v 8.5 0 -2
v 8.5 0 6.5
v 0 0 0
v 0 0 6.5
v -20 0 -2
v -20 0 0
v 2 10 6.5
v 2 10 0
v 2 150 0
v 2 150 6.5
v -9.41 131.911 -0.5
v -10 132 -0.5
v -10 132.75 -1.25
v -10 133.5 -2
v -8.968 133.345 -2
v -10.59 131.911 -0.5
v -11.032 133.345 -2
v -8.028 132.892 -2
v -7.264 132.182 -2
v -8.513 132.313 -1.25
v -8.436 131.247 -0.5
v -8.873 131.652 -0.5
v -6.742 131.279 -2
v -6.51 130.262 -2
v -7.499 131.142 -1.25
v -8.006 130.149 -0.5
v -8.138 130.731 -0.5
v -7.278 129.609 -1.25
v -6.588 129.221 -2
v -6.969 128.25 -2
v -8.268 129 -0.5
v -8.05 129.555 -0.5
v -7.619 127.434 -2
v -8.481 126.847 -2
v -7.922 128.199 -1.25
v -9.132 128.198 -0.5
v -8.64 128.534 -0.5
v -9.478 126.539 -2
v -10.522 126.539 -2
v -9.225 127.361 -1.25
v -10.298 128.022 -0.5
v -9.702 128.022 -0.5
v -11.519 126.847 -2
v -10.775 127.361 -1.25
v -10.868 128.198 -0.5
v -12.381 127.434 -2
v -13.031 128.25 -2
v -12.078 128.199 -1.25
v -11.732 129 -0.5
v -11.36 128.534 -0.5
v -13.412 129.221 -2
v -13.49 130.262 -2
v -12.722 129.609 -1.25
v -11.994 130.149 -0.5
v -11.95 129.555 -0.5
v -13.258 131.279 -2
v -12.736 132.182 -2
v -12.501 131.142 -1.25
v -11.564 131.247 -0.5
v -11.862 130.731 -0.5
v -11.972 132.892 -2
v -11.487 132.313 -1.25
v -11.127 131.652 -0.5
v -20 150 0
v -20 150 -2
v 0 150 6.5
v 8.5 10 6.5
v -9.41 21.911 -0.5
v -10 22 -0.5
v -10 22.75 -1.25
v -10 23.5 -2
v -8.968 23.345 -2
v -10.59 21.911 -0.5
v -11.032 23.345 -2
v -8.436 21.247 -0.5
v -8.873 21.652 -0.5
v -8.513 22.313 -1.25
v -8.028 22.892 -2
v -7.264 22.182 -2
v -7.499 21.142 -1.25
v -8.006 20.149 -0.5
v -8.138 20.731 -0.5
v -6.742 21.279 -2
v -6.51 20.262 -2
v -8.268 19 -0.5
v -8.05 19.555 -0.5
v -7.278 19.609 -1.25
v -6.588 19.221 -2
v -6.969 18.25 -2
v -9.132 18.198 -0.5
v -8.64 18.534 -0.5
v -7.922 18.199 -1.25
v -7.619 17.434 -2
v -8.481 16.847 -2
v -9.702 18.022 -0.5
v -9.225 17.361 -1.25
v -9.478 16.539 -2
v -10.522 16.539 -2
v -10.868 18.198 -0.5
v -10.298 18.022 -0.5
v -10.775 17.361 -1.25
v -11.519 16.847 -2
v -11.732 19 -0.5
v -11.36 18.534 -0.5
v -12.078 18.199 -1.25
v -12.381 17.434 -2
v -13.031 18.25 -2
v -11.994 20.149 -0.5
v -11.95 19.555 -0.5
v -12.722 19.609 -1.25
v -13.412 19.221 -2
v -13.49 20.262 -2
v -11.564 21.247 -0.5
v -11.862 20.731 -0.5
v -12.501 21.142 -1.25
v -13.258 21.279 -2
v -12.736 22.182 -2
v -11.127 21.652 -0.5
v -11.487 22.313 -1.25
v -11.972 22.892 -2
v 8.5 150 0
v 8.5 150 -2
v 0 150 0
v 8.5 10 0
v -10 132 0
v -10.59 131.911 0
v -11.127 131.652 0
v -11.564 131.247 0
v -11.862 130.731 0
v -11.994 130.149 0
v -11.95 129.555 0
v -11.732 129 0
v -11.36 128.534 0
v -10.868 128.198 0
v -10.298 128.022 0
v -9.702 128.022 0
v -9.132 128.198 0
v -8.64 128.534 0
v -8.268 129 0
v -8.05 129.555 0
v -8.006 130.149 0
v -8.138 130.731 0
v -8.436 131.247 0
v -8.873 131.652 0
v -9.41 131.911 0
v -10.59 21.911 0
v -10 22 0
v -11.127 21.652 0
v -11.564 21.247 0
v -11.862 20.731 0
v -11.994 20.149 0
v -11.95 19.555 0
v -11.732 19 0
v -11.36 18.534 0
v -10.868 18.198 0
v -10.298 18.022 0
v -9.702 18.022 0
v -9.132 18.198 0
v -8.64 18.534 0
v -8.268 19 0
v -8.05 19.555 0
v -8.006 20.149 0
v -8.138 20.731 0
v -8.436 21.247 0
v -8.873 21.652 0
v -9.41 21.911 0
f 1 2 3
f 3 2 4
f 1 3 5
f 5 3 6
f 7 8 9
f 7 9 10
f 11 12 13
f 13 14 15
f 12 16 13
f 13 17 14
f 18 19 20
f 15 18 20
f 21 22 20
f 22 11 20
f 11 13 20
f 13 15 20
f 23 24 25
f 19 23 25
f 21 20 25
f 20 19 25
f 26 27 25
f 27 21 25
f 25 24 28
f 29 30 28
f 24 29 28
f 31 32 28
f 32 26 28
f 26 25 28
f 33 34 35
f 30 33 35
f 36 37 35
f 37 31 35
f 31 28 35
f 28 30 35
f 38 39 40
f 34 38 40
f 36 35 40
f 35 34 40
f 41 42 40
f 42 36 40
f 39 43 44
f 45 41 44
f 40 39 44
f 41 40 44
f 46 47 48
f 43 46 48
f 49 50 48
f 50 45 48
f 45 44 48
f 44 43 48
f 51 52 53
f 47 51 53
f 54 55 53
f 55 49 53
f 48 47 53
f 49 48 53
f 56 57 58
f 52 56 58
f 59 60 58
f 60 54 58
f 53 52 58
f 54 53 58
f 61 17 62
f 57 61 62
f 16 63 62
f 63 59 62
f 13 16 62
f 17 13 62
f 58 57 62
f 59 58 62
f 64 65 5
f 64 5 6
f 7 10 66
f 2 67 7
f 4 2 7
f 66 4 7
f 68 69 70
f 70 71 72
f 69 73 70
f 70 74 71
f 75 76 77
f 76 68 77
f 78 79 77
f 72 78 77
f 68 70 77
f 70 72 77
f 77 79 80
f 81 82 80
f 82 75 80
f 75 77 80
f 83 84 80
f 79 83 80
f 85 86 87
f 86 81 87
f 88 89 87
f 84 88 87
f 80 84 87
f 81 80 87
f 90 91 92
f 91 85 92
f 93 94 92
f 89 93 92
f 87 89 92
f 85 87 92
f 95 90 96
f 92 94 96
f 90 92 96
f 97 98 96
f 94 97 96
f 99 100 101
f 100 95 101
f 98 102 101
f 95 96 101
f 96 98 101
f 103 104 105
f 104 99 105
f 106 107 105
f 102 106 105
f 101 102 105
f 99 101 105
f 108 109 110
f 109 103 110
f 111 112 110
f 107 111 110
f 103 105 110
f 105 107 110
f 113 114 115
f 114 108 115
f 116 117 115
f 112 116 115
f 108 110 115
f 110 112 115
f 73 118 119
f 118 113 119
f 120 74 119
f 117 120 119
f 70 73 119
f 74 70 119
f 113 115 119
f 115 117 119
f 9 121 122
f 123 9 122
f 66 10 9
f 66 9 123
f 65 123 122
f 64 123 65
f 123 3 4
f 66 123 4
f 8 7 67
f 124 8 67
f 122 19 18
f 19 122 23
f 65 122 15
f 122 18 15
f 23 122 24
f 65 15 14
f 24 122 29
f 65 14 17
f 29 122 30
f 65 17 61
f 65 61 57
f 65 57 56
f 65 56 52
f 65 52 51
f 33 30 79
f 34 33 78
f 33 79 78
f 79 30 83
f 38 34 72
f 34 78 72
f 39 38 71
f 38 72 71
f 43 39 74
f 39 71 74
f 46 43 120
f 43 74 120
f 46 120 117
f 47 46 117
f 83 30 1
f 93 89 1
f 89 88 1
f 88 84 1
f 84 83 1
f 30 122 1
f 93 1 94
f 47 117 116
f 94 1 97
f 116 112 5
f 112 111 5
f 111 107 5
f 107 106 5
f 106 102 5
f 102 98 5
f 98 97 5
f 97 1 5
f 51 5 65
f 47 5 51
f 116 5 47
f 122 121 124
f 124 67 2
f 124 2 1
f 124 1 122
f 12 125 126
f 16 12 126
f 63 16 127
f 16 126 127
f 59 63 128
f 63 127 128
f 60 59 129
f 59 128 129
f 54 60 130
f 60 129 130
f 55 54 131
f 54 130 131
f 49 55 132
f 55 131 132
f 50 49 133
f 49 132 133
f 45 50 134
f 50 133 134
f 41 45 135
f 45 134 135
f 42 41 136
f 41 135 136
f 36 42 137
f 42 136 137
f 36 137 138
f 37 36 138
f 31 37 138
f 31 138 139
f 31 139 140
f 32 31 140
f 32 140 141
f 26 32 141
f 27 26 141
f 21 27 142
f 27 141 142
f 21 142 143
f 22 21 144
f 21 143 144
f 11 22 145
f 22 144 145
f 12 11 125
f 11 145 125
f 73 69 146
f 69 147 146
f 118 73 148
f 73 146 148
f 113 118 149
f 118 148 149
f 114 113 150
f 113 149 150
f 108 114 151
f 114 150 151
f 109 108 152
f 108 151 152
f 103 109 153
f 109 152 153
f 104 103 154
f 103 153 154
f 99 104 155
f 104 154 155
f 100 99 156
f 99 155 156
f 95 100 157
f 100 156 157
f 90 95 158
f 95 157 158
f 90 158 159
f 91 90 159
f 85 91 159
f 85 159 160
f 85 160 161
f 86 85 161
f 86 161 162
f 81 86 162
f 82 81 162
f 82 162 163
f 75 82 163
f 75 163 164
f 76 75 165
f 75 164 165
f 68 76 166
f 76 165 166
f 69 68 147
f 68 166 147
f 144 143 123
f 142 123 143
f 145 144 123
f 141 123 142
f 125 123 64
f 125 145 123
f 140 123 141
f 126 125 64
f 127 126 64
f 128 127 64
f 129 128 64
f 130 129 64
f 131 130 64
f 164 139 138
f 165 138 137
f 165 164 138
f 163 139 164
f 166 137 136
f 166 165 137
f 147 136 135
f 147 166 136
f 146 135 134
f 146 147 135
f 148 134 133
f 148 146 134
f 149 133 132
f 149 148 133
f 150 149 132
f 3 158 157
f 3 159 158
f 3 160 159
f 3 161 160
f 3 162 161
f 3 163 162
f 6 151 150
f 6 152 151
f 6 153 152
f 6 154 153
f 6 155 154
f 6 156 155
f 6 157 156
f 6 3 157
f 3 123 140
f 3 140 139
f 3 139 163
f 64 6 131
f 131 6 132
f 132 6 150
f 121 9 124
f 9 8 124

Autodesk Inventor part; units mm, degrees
ref_plane "YZ Plane" through (0, 0, 0) normal (1, 0, 0) x (0, 1, 0)
ref_plane "XZ Plane" through (0, 0, 0) normal (0, 1, 0) x (-1, 0, 0)
ref_plane "XY Plane" through (0, 0, 0) normal (0, 0, 1) x (1, 0, 0)
sketch "Sketch1" plane through (0, 0, 0) normal (0, 1, 0) x (-1, 0, 0)
  line L0 (0, 0) -> (0, 6.5)
  line L1 (0, 0) -> (20, 0)
  line L2 (-2, -2) -> (20, -2)
  line L3 (-2, 0) -> (-2, 6.5)
  line L4 (20, -2) -> (20, 0)
  line L5 (-2, 0) -> (-8.5, 0)
  line L6 (-8.5, -2) -> (-2, -2)
  line L7 (-8.5, 0) -> (-8.5, -2)
  line L8 (-2, 6.5) -> (0, 6.5)
  dimension "d2" = 20
  dimension "d3" = 2
  dimension "d5" = 2
  dimension "d30" = 6.5
  dimension "d33" = 6.5
extrude "Extrusion1" add sketch "Sketch1" along normal blind 40
sketch "Sketch2" plane through (0, 0, 0) normal (0, -1, 0) x (1, 0, 0)
  line L0 (2, 0) -> (8.5, 0)
  line L1 (8.5, 0) -> (8.5, 6.5)
  line L2 (8.5, 6.5) -> (2, 6.5)
  line L3 (2, 6.5) -> (2, 0)
  point P0 (0, 0)
  dimension "d10" = 6.5
  dimension "d11" = 6.5
extrude "Extrusion2" add sketch "Sketch2" against normal blind 10
move faces "Move1" translate (0, 110, 0) faces at (-3.8333, 40, -1.3333)
sketch "Sketch3" plane through (22, 0, -2) normal (0, 0, -1) x (-1, 0, 0)
  line L0 (42, 0) -> (42, 40) projected
  circle A0 centre (32, 20) radius 3.5
  circle A1 centre (32, 20) radius 2
  line L1 (32, 20) -> (42, 20)
  line L2 (42, 0) -> (42, 40) projected
  line L3 (32, 20) -> (32, 130)
  point P0 (22, 0)
  dimension "d15" = 7
  dimension "d18" = 4
  dimension "d32" = 10
  dimension "d37" = 110
hole "Hole1" at (-10, 20, -2) at (-10, 130, -2) direction (0, 0, 1) diameter 4 end through all countersink diameter 7 countersink angle 90
properties part number "3DPrintBracket_Tall" material "PC/ABS Plastic"
